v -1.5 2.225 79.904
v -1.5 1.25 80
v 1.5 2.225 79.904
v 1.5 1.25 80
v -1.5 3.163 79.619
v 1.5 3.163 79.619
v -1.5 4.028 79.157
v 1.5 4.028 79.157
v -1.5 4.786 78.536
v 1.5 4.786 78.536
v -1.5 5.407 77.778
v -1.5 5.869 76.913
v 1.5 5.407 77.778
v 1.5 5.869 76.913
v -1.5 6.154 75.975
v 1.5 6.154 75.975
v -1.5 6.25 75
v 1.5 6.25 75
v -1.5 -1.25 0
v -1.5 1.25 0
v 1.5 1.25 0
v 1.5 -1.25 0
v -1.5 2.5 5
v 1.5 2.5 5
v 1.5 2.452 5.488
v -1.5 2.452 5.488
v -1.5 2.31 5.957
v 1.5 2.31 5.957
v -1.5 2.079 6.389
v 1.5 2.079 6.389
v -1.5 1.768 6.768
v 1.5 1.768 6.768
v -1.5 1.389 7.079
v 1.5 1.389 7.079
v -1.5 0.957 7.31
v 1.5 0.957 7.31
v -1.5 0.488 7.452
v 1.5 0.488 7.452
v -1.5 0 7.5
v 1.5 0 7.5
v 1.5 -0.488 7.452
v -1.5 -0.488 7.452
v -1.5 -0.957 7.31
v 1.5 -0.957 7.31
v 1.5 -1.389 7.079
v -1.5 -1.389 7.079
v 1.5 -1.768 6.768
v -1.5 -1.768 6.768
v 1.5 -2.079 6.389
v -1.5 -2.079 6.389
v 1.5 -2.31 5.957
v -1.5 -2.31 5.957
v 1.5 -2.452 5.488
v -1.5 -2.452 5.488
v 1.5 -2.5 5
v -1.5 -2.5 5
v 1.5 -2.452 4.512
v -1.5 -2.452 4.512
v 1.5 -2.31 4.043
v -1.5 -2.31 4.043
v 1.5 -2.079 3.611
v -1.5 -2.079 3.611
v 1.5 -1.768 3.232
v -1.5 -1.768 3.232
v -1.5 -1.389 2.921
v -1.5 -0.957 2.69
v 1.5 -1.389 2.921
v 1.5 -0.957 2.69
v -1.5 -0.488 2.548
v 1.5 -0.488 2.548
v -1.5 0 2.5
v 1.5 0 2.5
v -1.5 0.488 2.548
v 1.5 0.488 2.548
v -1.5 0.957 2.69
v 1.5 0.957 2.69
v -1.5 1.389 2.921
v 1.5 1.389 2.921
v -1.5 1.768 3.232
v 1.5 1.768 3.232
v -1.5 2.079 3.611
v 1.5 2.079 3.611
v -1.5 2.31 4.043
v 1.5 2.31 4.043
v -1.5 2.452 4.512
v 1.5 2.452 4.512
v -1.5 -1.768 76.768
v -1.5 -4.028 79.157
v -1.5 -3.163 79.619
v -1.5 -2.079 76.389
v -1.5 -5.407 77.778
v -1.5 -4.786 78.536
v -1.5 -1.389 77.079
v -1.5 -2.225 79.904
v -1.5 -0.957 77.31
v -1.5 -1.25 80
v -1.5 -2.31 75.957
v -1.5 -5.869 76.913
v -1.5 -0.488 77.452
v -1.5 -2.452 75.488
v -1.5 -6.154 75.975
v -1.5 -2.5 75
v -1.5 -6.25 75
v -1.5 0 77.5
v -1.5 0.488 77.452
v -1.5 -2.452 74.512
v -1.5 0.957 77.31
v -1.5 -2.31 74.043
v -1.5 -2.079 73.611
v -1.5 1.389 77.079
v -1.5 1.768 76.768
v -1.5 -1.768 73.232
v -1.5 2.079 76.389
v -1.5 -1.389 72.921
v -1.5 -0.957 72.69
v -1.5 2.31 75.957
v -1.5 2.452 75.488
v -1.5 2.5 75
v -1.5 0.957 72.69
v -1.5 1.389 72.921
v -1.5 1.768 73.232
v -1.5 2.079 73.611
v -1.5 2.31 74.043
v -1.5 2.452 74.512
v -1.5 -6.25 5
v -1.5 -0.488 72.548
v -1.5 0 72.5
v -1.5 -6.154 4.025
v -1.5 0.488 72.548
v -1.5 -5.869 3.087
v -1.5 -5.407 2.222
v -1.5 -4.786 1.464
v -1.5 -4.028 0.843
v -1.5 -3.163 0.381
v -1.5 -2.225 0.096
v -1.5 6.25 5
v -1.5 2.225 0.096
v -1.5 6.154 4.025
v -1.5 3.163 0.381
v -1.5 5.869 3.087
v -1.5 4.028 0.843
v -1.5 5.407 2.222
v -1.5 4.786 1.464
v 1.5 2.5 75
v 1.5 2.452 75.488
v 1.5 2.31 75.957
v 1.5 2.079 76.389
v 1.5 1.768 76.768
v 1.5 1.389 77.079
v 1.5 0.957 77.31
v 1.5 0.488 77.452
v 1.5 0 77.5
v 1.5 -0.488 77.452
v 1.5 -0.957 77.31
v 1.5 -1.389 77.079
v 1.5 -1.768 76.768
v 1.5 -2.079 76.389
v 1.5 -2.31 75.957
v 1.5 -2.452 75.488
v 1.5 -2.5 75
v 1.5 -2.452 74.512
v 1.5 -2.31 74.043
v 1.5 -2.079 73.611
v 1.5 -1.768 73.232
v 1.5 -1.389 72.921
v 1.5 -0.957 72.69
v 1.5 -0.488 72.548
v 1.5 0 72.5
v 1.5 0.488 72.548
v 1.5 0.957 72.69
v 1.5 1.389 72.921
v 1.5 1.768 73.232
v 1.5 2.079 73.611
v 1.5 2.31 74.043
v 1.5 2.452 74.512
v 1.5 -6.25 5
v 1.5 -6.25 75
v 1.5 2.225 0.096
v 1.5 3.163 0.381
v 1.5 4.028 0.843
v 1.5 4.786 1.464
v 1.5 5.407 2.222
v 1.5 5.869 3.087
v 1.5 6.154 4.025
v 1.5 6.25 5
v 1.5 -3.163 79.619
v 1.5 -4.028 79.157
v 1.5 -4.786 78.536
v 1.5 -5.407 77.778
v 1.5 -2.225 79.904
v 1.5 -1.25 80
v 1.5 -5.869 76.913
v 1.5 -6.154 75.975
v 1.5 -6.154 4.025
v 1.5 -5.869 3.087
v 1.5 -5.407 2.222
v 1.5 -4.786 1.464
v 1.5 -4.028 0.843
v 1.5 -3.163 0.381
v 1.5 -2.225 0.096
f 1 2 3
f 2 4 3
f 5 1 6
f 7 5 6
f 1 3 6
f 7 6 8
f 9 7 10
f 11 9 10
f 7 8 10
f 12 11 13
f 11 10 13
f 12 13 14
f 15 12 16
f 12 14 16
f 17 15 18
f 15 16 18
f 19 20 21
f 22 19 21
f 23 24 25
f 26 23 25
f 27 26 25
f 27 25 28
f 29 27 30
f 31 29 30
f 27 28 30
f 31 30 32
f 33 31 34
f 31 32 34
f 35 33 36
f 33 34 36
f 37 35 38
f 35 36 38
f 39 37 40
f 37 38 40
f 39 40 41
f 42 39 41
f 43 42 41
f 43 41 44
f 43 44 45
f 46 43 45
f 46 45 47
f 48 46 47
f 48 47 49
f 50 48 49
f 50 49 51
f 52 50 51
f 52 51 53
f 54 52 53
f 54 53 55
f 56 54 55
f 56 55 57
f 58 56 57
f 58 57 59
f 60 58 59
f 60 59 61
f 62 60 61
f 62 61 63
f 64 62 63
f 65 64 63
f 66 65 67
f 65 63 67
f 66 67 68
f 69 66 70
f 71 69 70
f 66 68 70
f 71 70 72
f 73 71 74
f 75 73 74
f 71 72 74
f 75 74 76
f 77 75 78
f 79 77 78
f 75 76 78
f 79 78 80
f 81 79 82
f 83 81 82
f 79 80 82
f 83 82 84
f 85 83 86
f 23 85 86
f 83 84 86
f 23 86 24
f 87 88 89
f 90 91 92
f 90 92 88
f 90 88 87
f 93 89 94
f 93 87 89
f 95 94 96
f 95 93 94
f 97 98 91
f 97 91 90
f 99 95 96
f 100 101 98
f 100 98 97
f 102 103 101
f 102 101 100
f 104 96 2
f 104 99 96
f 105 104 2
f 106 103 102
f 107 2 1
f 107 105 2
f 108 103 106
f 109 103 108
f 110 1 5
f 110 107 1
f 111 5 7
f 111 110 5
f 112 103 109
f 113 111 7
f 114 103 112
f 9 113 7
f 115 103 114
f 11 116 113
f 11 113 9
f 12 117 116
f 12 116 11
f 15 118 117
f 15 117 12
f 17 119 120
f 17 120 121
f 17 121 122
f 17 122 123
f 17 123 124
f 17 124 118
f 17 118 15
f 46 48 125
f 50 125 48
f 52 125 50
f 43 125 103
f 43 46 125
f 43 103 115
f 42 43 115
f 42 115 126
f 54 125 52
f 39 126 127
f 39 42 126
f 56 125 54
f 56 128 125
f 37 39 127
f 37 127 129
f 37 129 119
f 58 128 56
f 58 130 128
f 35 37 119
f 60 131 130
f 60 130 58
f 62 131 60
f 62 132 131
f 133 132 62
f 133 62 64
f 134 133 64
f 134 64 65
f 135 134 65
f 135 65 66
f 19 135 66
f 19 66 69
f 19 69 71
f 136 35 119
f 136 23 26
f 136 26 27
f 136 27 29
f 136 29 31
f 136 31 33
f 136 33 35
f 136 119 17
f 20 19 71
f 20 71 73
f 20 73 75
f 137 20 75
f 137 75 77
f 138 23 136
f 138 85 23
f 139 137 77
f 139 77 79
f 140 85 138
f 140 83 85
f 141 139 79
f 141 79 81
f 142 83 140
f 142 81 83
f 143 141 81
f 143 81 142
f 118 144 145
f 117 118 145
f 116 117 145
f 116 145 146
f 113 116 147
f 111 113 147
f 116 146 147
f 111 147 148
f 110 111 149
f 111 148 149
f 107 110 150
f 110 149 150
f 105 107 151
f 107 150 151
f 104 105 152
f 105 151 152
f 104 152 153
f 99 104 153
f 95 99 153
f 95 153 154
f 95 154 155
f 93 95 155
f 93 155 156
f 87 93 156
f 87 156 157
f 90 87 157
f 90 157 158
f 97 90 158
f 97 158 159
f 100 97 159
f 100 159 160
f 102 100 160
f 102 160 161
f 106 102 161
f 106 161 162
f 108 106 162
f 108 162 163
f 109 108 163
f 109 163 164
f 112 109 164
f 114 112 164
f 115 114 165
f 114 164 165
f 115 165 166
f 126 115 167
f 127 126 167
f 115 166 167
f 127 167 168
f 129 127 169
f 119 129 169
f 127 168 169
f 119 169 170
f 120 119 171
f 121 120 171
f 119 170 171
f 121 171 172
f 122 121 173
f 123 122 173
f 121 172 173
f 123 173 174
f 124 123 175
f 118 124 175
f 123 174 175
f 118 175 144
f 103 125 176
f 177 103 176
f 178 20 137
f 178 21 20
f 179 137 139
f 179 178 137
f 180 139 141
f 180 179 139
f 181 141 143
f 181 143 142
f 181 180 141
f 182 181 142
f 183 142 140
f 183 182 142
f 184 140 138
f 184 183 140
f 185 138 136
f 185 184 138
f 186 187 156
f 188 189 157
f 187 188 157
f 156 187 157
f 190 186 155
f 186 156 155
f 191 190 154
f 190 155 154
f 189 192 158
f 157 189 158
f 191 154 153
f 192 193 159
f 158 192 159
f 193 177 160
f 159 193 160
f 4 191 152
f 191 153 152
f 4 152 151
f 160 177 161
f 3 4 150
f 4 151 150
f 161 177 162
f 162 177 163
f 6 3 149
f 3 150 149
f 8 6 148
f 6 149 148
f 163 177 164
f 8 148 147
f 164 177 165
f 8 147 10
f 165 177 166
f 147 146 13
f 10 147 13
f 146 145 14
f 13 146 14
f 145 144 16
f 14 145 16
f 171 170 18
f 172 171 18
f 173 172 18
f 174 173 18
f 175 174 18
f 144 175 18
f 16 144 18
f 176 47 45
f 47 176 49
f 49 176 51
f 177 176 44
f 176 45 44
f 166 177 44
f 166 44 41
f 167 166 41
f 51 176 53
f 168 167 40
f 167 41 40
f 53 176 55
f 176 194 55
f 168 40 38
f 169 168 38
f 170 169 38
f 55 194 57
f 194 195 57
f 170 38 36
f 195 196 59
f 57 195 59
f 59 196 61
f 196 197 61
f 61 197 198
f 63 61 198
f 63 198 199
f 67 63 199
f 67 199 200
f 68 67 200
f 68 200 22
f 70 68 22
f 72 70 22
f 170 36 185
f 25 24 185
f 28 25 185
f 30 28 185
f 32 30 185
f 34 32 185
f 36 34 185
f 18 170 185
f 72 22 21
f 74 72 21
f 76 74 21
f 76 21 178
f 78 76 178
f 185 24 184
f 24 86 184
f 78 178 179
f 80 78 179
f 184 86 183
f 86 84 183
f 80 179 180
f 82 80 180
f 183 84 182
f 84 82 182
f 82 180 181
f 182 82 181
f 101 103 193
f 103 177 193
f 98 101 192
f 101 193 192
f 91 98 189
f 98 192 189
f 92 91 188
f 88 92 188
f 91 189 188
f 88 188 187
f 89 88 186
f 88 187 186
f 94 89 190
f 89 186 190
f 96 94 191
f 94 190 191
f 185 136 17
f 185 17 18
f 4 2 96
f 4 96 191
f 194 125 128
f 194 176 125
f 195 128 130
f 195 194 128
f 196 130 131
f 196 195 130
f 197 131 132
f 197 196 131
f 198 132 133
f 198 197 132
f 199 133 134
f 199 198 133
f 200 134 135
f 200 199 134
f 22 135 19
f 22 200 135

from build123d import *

# Parameters (mm, degrees)
F0_W     = 3
F0_H     = 12.5
F1_DEPTH = 80
F3_D     = 5
F4_R     = 5


with BuildPart() as f1:
    # F0 (on Top) → F1 (new body)
    with BuildSketch(Plane.XY):
        Rectangle(F0_W, F0_H)
    extrude(amount=F1_DEPTH)

    # F3 (through all)
    with Locations(Plane(origin=(-1.5, 0, 0), x_dir=(0, -1, 0), z_dir=(-1, 0, 0))):
        with Locations((0, 75), (0, 5)):
            Hole(F3_D / 2)

    # F4
    f4_edges = [f1.edges().sort_by_distance(p)[0] for p in [
        (0, -6.25, 80),
        (0, 6.25, 80),
        (0, 6.25, 0),
        (0, -6.25, 0),
    ]]
    fillet(f4_edges, radius=F4_R)


solid = f1.part
